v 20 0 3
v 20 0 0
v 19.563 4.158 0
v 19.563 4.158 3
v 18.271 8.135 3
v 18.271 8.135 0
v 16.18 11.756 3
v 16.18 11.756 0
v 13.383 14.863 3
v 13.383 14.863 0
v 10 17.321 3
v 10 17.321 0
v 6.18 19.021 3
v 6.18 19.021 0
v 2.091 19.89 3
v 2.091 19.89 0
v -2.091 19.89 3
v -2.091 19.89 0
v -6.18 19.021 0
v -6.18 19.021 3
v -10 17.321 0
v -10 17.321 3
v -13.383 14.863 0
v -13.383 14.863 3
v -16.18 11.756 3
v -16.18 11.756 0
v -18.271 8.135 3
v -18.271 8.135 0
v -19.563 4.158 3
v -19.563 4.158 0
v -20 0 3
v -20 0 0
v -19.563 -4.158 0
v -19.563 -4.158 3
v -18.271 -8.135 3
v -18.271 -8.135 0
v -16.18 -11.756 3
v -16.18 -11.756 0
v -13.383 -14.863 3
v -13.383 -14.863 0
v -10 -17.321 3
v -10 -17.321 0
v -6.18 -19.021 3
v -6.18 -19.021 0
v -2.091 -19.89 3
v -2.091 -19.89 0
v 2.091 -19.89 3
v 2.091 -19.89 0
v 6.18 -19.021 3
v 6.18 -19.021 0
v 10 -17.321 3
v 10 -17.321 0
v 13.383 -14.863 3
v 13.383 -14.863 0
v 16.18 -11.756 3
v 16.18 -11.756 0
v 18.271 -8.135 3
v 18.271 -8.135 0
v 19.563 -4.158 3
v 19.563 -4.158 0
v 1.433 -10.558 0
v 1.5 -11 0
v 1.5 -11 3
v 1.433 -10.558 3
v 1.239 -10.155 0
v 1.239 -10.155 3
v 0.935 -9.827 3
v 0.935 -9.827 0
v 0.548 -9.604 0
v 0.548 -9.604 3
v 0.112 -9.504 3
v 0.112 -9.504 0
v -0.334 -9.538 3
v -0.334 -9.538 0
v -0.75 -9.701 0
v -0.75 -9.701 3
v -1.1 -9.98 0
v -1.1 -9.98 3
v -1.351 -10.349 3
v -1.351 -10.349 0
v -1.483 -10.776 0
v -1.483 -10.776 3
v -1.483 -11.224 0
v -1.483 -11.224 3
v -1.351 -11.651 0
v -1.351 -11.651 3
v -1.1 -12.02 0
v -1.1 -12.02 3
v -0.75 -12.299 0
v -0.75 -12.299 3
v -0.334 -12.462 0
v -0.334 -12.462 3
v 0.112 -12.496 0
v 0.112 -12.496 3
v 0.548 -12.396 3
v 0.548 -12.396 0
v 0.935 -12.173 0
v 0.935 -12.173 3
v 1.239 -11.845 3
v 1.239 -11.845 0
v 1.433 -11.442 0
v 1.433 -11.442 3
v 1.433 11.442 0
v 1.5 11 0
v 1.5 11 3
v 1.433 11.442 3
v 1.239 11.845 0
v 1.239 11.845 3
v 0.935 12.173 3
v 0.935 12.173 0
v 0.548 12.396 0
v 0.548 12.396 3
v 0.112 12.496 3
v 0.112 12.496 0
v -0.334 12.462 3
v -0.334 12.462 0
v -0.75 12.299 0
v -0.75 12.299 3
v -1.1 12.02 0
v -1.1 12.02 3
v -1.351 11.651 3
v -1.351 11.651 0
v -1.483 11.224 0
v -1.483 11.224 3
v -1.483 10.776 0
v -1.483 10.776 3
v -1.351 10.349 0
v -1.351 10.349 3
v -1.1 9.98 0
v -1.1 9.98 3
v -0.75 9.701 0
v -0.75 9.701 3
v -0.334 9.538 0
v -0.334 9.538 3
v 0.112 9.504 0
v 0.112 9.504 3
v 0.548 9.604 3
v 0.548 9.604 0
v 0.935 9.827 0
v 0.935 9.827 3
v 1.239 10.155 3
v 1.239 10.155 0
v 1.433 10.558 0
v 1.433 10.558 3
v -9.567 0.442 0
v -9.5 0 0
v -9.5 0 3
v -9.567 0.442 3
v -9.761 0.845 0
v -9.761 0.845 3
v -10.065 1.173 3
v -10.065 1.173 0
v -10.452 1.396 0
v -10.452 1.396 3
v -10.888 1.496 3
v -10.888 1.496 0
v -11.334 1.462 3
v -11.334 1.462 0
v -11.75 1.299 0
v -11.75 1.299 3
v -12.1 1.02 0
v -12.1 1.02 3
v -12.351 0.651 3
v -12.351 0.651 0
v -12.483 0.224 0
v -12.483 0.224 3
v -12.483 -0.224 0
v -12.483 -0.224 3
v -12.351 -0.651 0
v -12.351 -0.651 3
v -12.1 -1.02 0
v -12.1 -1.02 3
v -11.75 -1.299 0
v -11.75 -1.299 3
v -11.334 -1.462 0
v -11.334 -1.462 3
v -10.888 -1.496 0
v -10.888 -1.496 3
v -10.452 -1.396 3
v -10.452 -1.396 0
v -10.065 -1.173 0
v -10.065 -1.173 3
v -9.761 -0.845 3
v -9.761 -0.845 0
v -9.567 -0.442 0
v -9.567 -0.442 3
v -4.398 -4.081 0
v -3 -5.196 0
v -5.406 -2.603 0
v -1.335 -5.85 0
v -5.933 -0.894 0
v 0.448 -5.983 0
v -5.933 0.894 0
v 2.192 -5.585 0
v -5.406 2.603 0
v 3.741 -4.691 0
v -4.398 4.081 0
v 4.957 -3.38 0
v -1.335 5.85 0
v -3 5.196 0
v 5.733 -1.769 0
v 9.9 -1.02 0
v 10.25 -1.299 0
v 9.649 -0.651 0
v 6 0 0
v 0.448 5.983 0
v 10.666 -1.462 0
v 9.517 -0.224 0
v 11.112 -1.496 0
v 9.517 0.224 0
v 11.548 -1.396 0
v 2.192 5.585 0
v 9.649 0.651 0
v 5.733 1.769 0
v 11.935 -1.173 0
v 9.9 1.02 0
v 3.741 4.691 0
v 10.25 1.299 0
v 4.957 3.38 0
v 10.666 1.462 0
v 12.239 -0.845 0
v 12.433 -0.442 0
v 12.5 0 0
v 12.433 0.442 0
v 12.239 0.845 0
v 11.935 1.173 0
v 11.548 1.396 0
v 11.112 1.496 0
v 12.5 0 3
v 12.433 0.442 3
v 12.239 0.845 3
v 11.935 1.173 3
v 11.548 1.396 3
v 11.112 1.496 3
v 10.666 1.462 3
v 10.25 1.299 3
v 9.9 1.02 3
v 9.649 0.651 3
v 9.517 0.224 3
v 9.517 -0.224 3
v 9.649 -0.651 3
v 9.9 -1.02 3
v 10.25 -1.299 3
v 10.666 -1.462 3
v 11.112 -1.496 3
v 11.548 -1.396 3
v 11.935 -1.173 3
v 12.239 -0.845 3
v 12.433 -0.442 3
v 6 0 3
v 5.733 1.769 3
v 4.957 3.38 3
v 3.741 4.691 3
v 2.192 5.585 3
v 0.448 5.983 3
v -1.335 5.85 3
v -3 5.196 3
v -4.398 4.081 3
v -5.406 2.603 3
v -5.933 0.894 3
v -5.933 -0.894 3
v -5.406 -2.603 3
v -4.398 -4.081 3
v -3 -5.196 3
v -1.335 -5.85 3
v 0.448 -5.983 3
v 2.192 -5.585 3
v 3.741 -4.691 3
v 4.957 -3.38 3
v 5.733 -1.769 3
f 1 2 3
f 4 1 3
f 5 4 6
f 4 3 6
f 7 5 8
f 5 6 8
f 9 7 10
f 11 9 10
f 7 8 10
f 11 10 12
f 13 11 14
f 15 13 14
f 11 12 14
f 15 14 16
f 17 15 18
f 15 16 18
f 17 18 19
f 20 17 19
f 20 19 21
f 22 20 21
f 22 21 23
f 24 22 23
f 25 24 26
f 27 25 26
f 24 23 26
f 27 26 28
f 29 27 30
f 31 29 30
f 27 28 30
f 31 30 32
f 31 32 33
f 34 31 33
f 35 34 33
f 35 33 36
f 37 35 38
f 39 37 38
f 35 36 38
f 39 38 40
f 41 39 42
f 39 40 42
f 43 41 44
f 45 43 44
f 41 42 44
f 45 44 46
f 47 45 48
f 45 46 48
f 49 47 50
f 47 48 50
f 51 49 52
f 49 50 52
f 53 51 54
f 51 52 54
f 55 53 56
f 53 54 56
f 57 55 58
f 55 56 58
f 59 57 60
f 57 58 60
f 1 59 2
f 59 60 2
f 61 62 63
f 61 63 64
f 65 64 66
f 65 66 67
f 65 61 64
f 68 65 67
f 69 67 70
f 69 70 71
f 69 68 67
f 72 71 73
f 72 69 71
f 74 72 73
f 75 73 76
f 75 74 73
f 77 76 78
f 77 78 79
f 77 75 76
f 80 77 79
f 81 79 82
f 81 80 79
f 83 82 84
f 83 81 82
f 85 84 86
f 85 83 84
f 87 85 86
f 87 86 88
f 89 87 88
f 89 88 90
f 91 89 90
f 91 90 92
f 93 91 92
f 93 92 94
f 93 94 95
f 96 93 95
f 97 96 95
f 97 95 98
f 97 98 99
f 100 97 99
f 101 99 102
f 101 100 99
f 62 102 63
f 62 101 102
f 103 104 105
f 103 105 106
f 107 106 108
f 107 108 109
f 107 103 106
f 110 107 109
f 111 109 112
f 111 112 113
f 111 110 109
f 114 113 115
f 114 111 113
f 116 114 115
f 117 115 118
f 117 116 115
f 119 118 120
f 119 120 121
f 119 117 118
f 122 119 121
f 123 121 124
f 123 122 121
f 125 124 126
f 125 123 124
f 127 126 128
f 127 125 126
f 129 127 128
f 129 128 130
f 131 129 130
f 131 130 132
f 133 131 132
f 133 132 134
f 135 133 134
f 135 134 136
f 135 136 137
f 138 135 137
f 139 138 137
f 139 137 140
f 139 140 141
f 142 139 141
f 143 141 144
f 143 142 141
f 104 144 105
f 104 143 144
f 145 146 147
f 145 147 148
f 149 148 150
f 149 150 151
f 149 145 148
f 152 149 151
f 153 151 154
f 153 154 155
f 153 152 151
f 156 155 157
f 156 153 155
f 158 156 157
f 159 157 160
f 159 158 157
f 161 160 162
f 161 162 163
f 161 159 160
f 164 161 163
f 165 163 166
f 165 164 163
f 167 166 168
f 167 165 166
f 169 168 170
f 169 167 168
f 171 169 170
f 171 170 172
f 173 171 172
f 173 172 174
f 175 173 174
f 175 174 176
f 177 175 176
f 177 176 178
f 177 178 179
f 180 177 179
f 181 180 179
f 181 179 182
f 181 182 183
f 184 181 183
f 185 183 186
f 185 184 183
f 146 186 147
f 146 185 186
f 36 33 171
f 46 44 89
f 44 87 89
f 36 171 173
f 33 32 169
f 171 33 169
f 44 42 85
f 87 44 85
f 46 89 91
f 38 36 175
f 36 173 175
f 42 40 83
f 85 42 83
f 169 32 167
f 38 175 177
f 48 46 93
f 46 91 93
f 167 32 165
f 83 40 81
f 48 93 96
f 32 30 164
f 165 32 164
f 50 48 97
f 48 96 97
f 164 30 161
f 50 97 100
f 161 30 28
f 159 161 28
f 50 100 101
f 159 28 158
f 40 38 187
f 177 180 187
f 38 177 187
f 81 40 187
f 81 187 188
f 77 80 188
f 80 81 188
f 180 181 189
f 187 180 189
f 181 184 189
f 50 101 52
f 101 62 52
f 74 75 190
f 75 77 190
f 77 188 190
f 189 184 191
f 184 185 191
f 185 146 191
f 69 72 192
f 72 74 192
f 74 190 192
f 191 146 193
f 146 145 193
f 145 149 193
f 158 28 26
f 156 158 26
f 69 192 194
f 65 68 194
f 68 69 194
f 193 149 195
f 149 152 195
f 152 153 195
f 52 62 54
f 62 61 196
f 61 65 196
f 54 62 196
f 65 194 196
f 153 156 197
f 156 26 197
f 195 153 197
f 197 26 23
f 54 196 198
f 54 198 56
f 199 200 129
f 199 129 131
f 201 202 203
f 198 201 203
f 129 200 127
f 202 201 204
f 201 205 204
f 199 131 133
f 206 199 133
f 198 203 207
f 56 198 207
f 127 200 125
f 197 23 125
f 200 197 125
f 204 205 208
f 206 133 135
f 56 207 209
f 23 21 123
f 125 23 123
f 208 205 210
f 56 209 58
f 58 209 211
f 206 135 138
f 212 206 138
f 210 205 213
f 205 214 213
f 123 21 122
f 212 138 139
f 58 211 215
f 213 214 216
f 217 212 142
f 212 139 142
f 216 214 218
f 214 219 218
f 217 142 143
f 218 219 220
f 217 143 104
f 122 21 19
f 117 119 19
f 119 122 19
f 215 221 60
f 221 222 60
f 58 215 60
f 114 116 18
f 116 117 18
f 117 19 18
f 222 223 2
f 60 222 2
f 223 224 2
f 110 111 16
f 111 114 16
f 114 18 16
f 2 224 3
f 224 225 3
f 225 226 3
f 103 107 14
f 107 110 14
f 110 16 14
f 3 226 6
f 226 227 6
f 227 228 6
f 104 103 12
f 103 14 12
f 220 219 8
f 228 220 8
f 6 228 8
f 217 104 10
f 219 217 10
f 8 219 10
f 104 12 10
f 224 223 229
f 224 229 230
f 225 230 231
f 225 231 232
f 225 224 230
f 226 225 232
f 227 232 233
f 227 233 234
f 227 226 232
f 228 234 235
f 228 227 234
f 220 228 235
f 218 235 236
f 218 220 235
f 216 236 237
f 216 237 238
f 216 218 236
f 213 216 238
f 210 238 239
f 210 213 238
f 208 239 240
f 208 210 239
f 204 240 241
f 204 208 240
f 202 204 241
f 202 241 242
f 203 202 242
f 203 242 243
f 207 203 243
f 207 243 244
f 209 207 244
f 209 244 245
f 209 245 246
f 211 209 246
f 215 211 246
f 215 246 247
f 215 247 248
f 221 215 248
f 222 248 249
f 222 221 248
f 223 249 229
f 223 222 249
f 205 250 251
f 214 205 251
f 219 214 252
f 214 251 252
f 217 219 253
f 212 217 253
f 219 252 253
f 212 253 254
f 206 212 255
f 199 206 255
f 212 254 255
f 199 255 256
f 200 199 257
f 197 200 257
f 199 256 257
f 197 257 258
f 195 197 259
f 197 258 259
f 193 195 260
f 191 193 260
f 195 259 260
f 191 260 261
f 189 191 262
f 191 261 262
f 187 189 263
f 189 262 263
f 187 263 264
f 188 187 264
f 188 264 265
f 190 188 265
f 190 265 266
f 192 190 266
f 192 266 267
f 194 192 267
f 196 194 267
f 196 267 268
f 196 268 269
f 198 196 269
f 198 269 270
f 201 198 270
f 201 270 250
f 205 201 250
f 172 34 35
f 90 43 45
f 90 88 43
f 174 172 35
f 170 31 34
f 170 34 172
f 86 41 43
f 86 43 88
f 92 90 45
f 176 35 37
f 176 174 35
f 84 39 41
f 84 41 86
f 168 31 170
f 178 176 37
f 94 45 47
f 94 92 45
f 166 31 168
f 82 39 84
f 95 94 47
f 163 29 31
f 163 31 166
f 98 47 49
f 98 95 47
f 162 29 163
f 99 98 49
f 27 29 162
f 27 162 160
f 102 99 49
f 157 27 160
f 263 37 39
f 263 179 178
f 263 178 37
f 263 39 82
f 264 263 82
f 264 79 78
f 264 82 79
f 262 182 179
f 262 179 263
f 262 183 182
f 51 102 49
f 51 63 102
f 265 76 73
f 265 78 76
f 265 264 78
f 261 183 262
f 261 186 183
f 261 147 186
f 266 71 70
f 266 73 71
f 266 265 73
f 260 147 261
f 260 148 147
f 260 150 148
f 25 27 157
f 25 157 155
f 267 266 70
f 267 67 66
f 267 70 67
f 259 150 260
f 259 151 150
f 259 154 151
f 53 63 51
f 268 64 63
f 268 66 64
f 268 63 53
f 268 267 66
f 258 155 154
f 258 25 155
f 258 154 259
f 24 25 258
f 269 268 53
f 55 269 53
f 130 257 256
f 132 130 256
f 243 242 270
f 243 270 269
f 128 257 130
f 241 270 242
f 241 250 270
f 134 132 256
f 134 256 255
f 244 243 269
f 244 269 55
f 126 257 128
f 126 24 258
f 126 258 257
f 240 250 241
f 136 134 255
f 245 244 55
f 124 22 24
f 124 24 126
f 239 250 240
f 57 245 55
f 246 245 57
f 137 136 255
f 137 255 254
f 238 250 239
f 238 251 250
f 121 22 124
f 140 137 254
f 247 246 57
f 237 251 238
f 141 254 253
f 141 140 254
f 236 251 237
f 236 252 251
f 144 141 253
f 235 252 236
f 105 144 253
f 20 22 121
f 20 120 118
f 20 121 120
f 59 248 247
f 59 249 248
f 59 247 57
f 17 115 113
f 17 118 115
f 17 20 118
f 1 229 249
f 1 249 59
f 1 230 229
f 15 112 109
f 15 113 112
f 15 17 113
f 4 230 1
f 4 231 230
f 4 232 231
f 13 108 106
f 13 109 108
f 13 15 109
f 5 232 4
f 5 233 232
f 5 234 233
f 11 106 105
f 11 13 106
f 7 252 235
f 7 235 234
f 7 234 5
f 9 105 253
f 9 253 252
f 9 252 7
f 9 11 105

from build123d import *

# Parameters (mm, degrees)
SKETCH_1_R          = 20
SKETCH_1_R_2        = 1.5
EXTRUDE_1_DEPTH     = 3
SKETCH_2_R          = 6
CUT_EXTRUDE_1_DEPTH = 29.442925307


with BuildPart() as part:
    # 草图1 → 凸台-拉伸1 (new body)
    with BuildSketch(Plane.XY):
        Circle(SKETCH_1_R)
        with Locations((0, 11)):
            Circle(SKETCH_1_R_2, mode=Mode.SUBTRACT)
        with Locations((11, 0)):
            Circle(SKETCH_1_R_2, mode=Mode.SUBTRACT)
        with Locations((0, -11)):
            Circle(SKETCH_1_R_2, mode=Mode.SUBTRACT)
        with Locations((-11, 0)):
            Circle(SKETCH_1_R_2, mode=Mode.SUBTRACT)
    extrude(amount=EXTRUDE_1_DEPTH)

    # 草图2 → 切除-拉伸1 (cut, through all)
    with BuildSketch(Plane.XY.offset(3)):
        Circle(SKETCH_2_R)
    extrude(amount=-CUT_EXTRUDE_1_DEPTH, mode=Mode.SUBTRACT)


solid = part.part
